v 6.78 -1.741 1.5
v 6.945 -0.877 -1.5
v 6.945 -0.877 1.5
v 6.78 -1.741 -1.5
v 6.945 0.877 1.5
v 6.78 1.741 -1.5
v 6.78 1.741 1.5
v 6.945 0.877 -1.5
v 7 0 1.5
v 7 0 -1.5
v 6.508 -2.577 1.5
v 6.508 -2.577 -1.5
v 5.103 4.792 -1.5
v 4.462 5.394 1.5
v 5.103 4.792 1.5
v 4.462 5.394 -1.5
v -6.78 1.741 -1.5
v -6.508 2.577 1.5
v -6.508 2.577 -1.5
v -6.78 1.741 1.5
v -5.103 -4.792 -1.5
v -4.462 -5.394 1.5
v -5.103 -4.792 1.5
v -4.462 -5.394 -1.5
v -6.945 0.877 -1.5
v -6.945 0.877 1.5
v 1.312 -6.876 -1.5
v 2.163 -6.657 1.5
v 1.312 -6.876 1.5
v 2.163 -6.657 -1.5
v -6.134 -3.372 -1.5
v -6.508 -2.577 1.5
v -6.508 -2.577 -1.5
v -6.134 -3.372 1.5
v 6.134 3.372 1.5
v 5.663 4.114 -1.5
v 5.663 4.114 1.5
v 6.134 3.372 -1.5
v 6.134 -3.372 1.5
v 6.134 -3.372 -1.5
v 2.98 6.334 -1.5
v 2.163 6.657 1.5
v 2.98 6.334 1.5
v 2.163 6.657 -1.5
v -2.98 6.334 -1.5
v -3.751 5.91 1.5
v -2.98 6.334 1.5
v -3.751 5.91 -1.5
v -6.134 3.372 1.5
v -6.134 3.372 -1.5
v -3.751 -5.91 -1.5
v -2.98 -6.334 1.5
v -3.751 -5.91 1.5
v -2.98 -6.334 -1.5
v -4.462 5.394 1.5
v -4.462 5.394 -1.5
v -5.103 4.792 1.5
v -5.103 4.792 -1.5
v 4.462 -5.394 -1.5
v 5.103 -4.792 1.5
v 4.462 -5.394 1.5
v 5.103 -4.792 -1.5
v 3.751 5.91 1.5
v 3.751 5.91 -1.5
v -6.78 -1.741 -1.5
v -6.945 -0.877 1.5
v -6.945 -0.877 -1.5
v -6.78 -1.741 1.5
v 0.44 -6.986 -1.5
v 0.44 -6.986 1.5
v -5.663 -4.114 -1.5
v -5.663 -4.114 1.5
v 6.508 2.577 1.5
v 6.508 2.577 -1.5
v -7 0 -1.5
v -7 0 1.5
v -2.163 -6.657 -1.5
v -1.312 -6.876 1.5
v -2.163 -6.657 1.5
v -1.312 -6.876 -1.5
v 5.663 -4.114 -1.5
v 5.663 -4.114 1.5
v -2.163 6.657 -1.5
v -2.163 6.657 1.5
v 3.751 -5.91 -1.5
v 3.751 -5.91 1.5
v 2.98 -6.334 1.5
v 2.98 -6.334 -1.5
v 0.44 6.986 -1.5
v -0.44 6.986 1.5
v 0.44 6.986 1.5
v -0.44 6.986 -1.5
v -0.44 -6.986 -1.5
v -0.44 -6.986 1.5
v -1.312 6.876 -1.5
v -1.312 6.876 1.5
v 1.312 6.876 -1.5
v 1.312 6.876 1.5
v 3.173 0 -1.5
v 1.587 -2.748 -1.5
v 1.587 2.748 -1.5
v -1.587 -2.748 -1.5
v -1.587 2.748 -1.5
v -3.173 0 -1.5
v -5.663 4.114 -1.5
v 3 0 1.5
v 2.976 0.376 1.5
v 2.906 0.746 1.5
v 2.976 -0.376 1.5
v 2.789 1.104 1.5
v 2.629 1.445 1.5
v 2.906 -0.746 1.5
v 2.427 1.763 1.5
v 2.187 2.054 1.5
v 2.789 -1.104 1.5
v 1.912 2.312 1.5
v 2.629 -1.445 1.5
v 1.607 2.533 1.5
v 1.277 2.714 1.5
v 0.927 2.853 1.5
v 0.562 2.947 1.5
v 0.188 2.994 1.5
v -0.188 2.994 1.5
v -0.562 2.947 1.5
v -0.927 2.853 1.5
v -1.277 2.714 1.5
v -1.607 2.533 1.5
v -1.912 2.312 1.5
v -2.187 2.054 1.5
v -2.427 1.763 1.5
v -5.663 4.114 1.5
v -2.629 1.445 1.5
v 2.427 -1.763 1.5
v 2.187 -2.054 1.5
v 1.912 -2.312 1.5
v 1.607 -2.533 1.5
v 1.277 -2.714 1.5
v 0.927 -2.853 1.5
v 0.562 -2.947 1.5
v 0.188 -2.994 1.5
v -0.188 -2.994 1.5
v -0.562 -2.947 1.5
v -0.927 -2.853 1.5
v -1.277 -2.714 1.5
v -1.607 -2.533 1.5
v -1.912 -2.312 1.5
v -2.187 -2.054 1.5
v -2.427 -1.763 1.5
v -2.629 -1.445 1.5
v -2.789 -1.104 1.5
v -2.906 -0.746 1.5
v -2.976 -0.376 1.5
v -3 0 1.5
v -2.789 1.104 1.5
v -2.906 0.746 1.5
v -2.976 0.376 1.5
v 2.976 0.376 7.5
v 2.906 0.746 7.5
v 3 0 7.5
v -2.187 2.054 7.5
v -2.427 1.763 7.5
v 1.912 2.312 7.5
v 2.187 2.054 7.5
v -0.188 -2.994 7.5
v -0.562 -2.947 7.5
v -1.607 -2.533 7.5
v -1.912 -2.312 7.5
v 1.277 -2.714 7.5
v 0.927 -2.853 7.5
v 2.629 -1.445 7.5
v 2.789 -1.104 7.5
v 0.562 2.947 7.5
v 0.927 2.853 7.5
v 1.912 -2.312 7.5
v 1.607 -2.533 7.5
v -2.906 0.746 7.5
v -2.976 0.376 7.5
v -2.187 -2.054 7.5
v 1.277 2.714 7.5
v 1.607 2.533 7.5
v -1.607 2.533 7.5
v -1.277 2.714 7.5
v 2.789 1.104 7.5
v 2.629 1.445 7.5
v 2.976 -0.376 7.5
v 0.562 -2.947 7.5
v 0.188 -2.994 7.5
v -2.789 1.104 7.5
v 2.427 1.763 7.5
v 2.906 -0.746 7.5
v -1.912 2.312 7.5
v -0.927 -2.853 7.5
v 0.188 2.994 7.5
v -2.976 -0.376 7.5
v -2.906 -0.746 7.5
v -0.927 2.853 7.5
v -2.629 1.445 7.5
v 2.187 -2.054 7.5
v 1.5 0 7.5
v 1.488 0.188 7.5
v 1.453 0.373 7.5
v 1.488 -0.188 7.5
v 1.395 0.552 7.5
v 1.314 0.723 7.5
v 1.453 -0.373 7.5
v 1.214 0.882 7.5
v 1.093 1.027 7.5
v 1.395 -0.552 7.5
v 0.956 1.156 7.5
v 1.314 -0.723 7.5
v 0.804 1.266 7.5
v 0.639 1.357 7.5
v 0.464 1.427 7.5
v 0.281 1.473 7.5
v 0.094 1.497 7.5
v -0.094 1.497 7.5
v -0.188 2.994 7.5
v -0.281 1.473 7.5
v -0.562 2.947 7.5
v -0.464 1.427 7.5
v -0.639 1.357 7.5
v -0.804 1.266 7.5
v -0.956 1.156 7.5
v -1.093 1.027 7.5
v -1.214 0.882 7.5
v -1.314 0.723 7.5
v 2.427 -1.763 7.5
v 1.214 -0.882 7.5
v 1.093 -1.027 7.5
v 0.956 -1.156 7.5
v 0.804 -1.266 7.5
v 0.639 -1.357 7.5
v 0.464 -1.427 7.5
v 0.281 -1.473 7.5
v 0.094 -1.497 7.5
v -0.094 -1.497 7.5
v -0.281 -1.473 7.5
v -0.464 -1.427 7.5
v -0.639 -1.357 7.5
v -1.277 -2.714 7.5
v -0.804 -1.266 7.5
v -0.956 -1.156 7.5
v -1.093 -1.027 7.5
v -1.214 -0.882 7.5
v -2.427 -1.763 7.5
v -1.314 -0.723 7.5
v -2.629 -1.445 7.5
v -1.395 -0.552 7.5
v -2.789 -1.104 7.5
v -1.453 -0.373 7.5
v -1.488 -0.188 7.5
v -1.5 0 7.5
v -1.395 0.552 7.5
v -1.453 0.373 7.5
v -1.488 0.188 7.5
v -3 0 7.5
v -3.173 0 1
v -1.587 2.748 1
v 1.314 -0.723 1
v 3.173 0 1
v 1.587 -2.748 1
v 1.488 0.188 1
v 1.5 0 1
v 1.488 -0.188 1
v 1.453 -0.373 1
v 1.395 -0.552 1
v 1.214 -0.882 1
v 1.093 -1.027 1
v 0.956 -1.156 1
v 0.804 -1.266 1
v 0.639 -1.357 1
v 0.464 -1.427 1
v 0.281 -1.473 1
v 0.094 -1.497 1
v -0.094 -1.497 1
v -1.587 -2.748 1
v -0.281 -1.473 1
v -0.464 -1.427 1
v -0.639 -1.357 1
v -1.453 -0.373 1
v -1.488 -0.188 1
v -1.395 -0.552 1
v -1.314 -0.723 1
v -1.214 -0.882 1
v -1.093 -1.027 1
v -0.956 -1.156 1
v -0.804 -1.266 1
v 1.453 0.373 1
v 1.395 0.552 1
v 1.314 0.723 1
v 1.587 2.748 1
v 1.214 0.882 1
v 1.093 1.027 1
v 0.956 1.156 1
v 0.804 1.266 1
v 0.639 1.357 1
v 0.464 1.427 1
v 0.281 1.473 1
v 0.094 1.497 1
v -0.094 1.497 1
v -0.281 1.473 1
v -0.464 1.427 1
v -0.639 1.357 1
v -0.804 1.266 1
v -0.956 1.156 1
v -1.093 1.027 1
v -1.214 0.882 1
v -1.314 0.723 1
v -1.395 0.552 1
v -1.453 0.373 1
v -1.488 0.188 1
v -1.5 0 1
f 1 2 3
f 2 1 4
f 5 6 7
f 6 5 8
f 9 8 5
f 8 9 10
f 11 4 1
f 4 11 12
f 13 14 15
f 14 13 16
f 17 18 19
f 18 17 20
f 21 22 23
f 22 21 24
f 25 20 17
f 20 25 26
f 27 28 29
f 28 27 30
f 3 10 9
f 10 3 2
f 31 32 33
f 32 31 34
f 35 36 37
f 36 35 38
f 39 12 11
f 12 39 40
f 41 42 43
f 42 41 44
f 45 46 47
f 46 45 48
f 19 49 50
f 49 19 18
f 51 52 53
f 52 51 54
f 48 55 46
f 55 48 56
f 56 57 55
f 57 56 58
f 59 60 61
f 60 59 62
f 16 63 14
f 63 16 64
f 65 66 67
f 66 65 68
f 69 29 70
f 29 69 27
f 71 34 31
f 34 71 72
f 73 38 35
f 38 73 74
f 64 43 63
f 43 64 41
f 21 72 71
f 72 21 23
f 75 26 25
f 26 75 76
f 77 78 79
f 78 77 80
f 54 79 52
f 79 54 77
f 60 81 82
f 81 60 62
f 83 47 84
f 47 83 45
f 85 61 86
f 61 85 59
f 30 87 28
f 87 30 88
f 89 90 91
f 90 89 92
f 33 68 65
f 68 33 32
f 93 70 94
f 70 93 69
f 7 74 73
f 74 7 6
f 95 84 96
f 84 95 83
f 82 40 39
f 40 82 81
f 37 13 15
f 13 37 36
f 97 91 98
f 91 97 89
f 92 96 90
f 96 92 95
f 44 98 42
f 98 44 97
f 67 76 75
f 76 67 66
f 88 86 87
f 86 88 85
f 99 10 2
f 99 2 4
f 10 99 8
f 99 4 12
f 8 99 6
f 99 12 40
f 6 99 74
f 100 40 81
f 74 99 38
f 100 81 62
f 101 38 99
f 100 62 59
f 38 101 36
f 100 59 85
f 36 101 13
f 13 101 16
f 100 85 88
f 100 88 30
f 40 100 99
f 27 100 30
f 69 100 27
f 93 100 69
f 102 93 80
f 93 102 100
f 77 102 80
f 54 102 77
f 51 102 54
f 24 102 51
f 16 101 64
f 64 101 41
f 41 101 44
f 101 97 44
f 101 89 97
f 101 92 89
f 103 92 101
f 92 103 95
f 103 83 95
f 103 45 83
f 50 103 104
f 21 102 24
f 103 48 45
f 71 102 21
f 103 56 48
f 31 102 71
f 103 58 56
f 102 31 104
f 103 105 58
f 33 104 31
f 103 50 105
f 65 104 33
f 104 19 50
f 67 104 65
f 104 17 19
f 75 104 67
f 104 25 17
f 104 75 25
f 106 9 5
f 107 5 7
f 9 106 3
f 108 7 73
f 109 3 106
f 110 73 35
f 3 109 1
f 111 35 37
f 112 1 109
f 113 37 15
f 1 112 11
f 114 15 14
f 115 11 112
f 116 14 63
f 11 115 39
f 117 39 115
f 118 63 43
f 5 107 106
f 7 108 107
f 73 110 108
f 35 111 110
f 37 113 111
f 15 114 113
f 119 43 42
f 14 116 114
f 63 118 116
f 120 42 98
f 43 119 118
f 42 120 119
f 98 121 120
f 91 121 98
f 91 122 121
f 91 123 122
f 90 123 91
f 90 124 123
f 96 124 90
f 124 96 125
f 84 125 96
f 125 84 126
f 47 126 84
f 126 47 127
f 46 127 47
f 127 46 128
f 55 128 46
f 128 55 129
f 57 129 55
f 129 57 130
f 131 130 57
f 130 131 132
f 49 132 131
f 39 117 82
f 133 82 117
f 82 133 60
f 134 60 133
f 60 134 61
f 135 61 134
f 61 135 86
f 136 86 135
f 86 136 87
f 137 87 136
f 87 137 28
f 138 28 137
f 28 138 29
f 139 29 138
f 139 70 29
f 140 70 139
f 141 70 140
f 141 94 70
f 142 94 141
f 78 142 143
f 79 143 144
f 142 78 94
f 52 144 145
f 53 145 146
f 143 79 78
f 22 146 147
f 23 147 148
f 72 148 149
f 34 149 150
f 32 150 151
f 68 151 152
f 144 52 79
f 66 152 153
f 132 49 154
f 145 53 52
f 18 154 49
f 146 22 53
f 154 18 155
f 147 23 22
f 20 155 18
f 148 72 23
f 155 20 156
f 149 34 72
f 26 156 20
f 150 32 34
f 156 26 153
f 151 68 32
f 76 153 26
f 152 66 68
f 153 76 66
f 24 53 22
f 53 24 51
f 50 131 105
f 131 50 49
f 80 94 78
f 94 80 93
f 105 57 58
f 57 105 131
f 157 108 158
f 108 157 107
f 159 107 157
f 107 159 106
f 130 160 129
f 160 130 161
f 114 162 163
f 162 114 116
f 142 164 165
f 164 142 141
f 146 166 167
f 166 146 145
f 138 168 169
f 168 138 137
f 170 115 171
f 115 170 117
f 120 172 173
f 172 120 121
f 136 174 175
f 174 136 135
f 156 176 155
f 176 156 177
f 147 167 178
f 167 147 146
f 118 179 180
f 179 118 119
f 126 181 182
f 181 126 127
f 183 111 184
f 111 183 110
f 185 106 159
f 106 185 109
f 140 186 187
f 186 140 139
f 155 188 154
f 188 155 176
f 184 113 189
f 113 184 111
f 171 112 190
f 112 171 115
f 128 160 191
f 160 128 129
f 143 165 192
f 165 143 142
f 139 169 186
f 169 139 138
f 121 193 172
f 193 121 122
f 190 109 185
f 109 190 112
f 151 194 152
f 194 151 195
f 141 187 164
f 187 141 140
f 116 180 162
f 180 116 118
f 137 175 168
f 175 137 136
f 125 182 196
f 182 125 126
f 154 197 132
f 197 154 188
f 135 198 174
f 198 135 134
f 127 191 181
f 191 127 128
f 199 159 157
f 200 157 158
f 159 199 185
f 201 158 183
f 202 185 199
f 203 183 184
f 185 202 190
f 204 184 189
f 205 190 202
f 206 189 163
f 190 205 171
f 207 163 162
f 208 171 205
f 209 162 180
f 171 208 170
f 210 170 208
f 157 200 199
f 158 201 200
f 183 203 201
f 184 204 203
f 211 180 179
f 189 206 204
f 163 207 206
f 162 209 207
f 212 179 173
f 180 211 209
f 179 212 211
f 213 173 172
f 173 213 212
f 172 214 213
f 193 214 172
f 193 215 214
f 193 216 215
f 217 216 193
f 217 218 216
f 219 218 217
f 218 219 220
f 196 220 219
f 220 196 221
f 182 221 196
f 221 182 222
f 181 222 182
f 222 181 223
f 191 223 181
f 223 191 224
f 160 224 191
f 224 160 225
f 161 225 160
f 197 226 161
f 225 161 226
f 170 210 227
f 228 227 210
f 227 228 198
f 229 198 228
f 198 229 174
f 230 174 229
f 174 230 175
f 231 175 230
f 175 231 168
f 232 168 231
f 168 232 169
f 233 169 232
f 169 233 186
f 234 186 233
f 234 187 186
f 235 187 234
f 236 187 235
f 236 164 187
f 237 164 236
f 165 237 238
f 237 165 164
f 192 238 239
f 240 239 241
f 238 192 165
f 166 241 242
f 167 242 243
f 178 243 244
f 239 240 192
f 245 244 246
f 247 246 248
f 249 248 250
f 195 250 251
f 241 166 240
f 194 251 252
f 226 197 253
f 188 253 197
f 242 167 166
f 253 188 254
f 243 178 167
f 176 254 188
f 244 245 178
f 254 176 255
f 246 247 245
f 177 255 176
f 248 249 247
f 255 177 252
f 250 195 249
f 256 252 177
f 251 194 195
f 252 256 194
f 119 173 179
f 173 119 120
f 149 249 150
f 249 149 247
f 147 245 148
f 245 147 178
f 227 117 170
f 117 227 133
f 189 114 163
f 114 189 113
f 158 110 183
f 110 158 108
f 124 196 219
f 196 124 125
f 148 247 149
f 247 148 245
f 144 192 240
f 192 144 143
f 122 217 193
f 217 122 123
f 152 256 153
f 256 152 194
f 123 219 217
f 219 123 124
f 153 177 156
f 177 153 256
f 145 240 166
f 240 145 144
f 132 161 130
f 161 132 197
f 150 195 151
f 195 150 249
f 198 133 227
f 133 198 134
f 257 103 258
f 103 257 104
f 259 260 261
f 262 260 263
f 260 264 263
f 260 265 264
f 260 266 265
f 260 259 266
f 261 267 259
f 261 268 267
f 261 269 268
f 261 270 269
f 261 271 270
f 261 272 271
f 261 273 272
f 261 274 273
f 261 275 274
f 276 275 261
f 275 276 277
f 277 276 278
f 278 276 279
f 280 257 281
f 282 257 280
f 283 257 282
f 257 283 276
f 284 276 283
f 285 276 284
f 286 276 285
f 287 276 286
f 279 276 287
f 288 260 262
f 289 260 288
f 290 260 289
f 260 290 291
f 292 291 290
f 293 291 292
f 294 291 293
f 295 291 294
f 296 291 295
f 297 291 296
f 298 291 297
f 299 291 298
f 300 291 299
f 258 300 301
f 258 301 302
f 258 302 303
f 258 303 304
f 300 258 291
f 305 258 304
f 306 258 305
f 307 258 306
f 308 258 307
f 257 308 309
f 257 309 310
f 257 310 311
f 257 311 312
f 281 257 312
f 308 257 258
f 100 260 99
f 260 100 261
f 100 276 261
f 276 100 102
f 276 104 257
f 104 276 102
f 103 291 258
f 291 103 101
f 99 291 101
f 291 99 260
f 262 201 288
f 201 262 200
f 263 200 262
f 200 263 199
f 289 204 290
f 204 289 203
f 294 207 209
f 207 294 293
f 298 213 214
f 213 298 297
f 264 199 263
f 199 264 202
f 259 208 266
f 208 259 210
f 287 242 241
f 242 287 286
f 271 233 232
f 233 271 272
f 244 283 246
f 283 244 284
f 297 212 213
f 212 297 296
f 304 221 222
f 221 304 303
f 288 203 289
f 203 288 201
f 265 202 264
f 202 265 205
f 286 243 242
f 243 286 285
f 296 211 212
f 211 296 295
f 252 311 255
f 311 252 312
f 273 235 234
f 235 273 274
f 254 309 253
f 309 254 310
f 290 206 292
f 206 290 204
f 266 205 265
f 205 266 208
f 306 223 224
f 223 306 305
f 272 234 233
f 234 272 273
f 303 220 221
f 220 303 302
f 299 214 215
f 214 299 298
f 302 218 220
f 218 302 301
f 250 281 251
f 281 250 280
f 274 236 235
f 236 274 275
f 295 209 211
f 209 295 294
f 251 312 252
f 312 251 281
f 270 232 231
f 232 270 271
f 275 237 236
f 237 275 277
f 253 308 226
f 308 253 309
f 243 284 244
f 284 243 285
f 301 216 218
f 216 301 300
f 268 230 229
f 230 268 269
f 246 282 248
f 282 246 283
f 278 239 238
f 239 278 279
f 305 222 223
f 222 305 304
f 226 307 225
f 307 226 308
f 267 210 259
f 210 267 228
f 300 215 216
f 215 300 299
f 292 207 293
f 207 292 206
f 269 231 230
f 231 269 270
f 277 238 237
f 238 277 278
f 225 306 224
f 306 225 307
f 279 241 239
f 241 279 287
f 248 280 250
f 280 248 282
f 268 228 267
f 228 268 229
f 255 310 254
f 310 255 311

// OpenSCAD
$fn = 50;


difference() {
	union() {
		translate(v = [0, 0, -1.5000000000]) {
			cylinder(h = 3, r = 7.0000000000);
		}
		translate(v = [0, 0, -1.5000000000]) {
			cylinder(h = 9, r = 3.0000000000);
		}
	}
	union() {
		translate(v = [0, 0, -1.5000000000]) {
			rotate(a = [0, 0, 0]) {
				difference() {
					union() {
						linear_extrude(height = 2.5000000000) {
							polygon(points = [[3.1735000000, 0.0000000000], [1.5867500000, 2.7483316189], [-1.5867500000, 2.7483316189], [-3.1735000000, 0.0000000000], [-1.5867500000, -2.7483316189], [1.5867500000, -2.7483316189]]);
						}
					}
					union();
				}
			}
		}
		translate(v = [0, 0, -100.0000000000]) {
			cylinder(h = 200, r = 1.5000000000);
		}
	}
}
